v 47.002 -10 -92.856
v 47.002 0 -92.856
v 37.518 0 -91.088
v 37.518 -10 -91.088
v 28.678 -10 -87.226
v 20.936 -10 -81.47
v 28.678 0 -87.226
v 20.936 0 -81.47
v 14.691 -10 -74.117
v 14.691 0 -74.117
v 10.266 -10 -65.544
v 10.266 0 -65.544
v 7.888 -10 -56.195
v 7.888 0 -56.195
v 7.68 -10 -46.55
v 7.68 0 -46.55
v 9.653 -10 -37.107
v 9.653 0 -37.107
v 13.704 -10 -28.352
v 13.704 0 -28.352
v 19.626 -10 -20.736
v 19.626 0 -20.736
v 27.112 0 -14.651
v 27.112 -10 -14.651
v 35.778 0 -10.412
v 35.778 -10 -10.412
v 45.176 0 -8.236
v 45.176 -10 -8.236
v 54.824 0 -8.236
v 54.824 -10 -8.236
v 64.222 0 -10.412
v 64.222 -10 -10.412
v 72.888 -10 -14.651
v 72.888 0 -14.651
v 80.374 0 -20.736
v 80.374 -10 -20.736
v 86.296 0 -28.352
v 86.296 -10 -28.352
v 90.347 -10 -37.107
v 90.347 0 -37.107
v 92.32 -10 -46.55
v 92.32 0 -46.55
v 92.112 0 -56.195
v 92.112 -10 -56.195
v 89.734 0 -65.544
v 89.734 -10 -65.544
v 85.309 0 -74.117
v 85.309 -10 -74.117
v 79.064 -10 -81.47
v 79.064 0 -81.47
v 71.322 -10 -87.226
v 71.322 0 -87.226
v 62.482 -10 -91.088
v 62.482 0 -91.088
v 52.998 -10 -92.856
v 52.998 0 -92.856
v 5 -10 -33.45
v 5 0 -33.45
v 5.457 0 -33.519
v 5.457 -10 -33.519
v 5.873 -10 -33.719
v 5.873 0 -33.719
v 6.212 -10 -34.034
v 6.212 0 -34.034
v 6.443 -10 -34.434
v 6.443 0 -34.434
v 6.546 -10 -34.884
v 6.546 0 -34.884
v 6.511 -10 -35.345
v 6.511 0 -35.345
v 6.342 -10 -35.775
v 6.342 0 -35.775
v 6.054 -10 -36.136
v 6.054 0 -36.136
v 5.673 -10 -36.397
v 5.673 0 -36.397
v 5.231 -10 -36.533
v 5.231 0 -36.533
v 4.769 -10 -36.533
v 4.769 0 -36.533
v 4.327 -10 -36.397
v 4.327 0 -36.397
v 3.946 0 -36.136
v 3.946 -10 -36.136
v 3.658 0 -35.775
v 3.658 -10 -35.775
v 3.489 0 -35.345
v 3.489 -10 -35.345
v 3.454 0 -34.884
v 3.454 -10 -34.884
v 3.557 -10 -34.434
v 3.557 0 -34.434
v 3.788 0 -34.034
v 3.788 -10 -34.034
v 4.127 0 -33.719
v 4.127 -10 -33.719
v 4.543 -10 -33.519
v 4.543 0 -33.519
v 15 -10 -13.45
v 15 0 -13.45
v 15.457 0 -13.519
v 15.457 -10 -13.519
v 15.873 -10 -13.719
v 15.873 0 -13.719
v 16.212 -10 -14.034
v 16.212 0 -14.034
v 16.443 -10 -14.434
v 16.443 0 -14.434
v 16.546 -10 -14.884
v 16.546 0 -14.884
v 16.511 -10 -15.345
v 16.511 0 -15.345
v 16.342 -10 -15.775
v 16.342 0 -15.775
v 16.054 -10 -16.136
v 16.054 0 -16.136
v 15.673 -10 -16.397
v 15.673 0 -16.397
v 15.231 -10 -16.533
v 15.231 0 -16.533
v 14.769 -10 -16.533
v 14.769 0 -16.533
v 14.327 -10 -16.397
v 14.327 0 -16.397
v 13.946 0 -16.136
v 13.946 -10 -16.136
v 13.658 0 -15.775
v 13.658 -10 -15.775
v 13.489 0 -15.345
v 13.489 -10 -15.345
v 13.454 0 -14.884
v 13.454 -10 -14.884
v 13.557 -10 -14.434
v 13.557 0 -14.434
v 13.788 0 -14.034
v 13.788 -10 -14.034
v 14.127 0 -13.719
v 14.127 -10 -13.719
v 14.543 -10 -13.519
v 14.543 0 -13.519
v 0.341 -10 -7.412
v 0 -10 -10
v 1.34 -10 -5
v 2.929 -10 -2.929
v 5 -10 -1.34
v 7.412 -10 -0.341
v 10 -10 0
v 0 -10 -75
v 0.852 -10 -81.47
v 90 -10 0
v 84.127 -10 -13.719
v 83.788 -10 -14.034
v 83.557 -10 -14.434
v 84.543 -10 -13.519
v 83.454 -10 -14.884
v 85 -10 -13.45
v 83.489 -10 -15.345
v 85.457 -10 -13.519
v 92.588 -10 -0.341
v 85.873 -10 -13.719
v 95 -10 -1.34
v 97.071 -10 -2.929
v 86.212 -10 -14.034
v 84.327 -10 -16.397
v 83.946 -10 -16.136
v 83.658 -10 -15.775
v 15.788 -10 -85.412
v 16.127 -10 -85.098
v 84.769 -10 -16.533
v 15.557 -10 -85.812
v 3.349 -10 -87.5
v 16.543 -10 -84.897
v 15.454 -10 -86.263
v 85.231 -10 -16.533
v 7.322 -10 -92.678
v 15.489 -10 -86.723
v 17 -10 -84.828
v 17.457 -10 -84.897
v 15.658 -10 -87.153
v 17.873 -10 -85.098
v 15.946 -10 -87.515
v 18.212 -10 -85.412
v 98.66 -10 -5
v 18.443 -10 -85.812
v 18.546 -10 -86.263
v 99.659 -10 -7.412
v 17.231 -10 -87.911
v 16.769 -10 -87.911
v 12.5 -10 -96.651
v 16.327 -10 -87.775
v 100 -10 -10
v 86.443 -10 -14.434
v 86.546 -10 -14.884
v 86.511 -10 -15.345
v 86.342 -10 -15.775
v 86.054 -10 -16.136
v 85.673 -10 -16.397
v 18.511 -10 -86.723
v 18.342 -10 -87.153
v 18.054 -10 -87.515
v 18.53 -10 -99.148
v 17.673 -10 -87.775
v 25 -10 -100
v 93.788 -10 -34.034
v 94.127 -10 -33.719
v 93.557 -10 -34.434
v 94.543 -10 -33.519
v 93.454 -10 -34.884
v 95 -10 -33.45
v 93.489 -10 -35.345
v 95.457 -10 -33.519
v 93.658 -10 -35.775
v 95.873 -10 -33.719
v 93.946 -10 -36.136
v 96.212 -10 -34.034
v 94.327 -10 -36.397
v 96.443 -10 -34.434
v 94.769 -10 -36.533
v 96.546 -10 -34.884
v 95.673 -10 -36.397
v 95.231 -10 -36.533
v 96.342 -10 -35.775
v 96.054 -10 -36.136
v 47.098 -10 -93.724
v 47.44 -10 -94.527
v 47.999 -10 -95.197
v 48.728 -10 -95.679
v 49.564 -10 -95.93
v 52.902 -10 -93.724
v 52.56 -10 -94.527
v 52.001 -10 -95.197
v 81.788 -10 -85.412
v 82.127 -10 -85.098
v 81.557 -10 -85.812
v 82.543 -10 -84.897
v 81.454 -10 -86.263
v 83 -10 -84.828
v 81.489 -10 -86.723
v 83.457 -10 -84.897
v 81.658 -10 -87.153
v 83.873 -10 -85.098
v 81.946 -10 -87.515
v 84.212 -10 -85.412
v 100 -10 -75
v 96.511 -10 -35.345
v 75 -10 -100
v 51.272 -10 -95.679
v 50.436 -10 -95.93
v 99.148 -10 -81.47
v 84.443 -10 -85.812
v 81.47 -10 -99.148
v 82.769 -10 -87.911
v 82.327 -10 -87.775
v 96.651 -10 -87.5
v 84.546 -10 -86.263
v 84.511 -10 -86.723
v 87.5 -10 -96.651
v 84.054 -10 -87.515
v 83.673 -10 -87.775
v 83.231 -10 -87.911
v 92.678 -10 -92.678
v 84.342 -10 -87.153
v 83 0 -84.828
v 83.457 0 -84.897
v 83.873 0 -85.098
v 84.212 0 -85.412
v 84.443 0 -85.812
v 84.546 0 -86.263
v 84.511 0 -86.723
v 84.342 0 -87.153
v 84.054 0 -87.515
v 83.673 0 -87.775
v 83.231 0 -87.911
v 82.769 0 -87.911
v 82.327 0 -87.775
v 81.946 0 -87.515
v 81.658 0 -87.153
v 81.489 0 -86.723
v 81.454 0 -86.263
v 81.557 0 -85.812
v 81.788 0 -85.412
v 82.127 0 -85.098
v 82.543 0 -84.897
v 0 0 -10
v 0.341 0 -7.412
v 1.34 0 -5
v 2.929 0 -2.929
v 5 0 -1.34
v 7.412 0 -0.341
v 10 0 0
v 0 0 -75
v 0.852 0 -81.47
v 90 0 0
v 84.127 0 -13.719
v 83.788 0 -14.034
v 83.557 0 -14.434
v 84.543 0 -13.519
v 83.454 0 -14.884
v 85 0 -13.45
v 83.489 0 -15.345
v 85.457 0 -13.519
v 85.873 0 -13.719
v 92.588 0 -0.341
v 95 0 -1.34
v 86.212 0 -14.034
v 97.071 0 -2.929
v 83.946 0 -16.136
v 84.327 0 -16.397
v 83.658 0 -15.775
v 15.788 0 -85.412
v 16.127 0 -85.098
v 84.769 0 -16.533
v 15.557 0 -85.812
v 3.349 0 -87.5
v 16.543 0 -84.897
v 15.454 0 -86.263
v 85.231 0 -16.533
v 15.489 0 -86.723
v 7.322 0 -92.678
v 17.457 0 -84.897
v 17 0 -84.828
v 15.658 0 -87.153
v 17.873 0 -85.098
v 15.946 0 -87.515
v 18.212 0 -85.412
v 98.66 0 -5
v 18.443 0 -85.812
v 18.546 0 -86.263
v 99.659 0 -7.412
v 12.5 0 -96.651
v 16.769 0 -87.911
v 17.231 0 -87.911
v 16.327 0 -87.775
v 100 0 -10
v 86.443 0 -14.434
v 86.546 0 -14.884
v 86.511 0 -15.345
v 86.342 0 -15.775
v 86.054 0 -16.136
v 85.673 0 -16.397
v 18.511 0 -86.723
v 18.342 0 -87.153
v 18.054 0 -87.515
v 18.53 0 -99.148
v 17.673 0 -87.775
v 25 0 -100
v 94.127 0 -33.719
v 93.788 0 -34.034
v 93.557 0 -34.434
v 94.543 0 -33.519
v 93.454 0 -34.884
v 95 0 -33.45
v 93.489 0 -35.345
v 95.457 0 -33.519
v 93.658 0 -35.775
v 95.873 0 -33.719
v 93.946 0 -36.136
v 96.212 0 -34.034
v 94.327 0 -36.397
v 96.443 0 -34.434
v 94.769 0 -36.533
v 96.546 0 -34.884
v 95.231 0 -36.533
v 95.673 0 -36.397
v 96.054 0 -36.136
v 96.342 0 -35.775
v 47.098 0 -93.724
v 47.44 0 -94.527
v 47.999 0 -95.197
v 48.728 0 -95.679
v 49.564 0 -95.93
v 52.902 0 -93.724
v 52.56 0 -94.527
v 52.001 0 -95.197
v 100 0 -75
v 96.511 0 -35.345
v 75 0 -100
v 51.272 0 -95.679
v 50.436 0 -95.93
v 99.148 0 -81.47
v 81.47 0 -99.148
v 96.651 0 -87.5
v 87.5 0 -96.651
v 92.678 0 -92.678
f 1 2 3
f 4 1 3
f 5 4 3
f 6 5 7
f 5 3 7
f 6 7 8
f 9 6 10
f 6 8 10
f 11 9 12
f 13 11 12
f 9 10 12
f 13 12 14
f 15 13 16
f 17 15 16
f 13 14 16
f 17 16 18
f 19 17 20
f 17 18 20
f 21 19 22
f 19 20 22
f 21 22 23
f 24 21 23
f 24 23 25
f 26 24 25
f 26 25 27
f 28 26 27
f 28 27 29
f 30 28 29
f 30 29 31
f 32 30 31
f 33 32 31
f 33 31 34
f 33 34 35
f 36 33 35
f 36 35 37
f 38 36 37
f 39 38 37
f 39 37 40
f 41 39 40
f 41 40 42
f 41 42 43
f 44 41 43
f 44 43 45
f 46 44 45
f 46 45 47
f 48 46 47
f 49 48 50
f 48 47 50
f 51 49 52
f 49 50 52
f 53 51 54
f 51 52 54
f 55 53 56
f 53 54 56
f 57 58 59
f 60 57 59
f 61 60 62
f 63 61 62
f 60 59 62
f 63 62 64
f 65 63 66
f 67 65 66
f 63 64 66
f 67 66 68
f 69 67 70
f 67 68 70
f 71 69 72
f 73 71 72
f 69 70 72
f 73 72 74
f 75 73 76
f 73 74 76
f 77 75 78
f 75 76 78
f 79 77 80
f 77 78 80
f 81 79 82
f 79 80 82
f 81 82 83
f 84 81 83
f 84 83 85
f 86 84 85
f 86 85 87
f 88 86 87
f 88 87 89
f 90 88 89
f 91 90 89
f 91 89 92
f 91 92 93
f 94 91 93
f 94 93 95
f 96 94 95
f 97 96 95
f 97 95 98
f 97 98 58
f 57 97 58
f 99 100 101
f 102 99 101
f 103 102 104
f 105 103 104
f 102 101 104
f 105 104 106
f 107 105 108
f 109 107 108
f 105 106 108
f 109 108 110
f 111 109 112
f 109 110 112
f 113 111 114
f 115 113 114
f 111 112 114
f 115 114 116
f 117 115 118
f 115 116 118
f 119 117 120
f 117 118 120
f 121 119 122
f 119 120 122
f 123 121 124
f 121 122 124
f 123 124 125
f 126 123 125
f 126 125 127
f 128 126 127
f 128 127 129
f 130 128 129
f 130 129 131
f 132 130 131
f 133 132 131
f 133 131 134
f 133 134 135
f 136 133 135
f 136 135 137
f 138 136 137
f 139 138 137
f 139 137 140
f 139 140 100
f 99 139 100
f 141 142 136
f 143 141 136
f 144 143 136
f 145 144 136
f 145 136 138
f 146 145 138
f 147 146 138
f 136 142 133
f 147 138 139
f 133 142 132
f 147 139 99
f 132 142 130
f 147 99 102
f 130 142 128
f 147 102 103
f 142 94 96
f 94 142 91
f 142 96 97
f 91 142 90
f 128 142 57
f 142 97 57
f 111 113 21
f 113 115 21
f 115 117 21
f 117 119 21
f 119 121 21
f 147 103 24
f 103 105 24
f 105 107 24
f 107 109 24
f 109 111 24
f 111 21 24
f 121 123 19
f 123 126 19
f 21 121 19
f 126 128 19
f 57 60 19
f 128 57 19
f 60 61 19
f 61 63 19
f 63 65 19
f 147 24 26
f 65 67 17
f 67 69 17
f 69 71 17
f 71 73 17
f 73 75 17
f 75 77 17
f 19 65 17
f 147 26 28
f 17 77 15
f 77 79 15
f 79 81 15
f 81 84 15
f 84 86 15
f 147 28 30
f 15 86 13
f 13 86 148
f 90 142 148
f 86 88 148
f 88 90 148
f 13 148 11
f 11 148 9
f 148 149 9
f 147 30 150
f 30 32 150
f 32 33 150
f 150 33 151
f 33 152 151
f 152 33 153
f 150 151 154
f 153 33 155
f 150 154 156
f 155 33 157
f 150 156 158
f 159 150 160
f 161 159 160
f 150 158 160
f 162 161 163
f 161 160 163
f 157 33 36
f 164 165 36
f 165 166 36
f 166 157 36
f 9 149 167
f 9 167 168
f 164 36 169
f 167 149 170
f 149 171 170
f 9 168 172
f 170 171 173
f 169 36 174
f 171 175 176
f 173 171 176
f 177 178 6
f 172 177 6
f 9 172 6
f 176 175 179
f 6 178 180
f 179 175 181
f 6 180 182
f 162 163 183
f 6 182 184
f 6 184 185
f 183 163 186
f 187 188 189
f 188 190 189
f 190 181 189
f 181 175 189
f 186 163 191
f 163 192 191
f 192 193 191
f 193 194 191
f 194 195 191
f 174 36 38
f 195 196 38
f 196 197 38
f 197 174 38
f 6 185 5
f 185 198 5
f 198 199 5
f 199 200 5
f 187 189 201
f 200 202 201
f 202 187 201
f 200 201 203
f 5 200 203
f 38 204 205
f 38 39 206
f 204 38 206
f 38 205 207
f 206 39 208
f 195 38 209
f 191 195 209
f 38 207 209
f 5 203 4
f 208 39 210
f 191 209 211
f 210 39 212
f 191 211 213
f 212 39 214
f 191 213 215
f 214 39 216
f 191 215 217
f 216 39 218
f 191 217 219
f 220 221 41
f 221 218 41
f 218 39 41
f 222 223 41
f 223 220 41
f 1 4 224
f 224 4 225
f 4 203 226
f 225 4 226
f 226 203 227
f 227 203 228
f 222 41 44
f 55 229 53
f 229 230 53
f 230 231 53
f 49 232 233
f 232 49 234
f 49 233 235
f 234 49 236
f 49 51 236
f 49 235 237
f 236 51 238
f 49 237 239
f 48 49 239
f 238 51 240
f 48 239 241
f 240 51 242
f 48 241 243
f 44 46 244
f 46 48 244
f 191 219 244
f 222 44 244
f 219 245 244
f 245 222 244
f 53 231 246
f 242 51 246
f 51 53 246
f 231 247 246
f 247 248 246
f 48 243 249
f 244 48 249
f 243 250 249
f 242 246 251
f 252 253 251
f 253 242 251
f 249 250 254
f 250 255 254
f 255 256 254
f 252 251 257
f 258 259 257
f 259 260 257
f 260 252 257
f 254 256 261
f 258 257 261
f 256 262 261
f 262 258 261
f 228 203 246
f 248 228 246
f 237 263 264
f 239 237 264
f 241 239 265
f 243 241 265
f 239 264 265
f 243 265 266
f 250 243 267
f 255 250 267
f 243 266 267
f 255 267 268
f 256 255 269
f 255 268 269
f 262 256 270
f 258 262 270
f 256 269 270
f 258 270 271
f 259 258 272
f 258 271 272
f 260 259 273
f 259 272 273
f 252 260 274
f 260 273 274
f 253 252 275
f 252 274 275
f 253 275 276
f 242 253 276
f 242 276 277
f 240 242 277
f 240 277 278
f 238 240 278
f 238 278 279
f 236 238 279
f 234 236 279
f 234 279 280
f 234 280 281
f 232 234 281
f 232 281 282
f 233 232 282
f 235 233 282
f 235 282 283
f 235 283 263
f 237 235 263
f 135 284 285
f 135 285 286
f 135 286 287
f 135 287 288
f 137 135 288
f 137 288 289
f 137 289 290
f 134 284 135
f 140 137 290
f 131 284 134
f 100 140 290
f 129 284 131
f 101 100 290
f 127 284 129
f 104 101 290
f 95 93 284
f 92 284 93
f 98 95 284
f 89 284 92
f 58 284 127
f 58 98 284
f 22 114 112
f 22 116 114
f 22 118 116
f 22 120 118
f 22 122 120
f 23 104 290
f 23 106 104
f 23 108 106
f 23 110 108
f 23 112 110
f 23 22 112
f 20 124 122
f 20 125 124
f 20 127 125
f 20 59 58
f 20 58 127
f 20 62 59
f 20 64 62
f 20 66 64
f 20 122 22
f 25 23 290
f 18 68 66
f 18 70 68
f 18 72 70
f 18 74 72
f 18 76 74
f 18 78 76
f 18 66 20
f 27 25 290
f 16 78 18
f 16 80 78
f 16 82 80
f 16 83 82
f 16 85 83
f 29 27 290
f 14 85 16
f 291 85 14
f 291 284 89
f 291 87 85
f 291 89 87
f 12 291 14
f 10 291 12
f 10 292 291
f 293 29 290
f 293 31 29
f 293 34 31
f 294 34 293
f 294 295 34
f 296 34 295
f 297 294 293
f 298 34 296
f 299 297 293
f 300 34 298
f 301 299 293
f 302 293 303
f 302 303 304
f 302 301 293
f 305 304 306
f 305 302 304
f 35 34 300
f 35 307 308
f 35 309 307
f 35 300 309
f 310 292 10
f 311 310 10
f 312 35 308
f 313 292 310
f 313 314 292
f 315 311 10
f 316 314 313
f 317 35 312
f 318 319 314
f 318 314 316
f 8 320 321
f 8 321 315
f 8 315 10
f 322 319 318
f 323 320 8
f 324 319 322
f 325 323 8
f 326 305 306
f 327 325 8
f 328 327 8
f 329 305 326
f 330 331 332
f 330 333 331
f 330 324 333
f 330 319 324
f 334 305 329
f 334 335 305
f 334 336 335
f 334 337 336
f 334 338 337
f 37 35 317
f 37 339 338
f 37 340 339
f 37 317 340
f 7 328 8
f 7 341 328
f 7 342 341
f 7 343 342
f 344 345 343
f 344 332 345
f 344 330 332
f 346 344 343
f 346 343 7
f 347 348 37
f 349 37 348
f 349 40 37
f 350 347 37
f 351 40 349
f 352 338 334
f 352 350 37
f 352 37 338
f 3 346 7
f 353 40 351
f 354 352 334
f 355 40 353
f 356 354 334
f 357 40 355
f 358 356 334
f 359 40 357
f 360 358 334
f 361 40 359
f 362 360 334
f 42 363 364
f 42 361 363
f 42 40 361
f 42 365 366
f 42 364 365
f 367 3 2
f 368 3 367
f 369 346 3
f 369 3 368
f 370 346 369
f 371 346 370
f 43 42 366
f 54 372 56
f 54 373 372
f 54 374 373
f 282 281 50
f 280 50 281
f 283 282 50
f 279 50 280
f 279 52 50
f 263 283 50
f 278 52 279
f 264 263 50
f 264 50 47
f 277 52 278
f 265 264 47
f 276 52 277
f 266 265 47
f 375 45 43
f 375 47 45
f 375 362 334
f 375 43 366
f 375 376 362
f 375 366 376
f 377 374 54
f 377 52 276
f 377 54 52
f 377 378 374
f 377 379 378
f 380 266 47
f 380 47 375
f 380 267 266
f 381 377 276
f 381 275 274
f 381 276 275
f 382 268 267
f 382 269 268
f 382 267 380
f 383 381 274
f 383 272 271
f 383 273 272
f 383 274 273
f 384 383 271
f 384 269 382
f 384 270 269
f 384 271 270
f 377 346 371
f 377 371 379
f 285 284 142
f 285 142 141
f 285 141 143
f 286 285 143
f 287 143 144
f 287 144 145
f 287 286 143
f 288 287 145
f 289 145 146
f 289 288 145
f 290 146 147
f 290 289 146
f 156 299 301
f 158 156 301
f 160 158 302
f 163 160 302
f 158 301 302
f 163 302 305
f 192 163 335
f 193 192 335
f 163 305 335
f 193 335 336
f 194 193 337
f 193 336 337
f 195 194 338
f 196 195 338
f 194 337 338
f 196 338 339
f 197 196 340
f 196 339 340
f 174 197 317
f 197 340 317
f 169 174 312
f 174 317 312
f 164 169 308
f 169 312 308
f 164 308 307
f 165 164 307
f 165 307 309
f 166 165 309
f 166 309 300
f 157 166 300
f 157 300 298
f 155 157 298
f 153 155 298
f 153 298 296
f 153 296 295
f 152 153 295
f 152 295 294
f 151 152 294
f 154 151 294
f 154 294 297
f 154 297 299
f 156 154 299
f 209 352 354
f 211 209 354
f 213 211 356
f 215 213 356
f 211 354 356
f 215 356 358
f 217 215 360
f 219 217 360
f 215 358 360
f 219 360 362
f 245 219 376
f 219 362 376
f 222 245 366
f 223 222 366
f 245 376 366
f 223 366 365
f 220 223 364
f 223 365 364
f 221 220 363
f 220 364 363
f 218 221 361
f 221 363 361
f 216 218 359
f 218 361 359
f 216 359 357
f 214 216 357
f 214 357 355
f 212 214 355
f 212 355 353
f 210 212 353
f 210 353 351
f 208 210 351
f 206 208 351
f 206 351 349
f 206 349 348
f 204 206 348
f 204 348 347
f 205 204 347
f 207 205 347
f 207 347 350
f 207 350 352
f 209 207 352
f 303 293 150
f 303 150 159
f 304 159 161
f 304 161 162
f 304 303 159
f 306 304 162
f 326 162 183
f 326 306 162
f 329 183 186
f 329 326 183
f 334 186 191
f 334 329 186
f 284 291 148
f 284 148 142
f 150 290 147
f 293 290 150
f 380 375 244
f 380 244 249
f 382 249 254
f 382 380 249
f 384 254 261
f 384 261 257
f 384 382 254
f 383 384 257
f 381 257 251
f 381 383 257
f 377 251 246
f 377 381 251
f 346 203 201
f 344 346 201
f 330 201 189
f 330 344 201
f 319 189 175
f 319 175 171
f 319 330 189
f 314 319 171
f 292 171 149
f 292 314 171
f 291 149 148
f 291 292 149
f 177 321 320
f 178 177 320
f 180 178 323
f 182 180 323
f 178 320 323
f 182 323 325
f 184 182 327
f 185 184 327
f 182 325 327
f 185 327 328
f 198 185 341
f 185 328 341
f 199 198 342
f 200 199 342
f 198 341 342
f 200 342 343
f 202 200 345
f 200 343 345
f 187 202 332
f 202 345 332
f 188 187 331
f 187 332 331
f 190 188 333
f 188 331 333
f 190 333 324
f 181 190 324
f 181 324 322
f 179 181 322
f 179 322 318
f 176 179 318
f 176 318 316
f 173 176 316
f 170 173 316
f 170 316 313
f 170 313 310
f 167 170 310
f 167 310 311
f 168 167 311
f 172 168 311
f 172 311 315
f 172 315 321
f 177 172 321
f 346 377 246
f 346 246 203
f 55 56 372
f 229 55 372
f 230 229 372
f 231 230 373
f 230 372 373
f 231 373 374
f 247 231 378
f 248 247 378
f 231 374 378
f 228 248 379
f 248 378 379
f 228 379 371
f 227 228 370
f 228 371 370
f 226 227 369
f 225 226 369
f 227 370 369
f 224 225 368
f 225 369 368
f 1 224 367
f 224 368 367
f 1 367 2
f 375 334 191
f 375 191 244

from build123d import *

# Parameters (mm, degrees)
DODANIE_WYCI_GNI_CIE1_DEPTH = 10
WYTNIJ_WYCI_GNI_CIE2_DEPTH  = 142.774468788
SZKIC5_R                    = 1.55
WYTNIJ_WYCI_GNI_CIE3_DEPTH  = 142.774468788


with BuildPart() as part:
    # Szkic1 → Dodanie-wyciągnięcie1 (new body)
    with BuildSketch(Plane(origin=(0, 0, 0), x_dir=(1, 0, 0), z_dir=(0, 1, 0))):
        with BuildLine():
            Line((10, 0), (90, 0))
            ThreePointArc((90, 0), (97.071067812, 2.928932188), (100, 10))
            Line((100, 10), (100, 75))
            ThreePointArc((100, 75), (92.67766953, 92.67766953), (75, 100))
            Line((75, 100), (25, 100))
            ThreePointArc((25, 100), (7.32233047, 92.67766953), (0, 75))
            Line((0, 75), (0, 10))
            ThreePointArc((0, 10), (2.928932188, 2.928932188), (10, 0))
        make_face()
    extrude(amount=-DODANIE_WYCI_GNI_CIE1_DEPTH)

    # Szkic4 → Wytnij-wyciągnięcie2 (cut, through all)
    with BuildSketch(Plane(origin=(0, 0, 0), x_dir=(1, 0, 0), z_dir=(0, 1, 0))):
        with BuildLine():
            ThreePointArc((47.001869094, 92.855975693), (50, 7.961858046), (52.998130906, 92.855975693))
            ThreePointArc((52.998130906, 92.855975693), (50, 95.961858046), (47.001869094, 92.855975693))
        make_face()
    extrude(amount=-WYTNIJ_WYCI_GNI_CIE2_DEPTH, mode=Mode.SUBTRACT)

    # Szkic5 → Wytnij-wyciągnięcie3 (cut, through all)
    with BuildSketch(Plane(origin=(0, 0, 0), x_dir=(1, 0, 0), z_dir=(0, 1, 0))):
        with Locations(Location((83, 86.378345537, 0), (0, 0, 270))):
            Circle(SZKIC5_R)
        with Locations(Location((85, 15, 0), (0, 0, 270))):
            Circle(SZKIC5_R)
        with Locations(Location((5, 35, 0), (0, 0, 270))):
            Circle(SZKIC5_R)
        with Locations(Location((95, 35, 0), (0, 0, 270))):
            Circle(SZKIC5_R)
        with Locations(Location((17, 86.378345537, 0), (0, 0, 270))):
            Circle(SZKIC5_R)
        with Locations(Location((15, 15, 0), (0, 0, 270))):
            Circle(SZKIC5_R)
    extrude(amount=-WYTNIJ_WYCI_GNI_CIE3_DEPTH, mode=Mode.SUBTRACT)


solid = part.part
